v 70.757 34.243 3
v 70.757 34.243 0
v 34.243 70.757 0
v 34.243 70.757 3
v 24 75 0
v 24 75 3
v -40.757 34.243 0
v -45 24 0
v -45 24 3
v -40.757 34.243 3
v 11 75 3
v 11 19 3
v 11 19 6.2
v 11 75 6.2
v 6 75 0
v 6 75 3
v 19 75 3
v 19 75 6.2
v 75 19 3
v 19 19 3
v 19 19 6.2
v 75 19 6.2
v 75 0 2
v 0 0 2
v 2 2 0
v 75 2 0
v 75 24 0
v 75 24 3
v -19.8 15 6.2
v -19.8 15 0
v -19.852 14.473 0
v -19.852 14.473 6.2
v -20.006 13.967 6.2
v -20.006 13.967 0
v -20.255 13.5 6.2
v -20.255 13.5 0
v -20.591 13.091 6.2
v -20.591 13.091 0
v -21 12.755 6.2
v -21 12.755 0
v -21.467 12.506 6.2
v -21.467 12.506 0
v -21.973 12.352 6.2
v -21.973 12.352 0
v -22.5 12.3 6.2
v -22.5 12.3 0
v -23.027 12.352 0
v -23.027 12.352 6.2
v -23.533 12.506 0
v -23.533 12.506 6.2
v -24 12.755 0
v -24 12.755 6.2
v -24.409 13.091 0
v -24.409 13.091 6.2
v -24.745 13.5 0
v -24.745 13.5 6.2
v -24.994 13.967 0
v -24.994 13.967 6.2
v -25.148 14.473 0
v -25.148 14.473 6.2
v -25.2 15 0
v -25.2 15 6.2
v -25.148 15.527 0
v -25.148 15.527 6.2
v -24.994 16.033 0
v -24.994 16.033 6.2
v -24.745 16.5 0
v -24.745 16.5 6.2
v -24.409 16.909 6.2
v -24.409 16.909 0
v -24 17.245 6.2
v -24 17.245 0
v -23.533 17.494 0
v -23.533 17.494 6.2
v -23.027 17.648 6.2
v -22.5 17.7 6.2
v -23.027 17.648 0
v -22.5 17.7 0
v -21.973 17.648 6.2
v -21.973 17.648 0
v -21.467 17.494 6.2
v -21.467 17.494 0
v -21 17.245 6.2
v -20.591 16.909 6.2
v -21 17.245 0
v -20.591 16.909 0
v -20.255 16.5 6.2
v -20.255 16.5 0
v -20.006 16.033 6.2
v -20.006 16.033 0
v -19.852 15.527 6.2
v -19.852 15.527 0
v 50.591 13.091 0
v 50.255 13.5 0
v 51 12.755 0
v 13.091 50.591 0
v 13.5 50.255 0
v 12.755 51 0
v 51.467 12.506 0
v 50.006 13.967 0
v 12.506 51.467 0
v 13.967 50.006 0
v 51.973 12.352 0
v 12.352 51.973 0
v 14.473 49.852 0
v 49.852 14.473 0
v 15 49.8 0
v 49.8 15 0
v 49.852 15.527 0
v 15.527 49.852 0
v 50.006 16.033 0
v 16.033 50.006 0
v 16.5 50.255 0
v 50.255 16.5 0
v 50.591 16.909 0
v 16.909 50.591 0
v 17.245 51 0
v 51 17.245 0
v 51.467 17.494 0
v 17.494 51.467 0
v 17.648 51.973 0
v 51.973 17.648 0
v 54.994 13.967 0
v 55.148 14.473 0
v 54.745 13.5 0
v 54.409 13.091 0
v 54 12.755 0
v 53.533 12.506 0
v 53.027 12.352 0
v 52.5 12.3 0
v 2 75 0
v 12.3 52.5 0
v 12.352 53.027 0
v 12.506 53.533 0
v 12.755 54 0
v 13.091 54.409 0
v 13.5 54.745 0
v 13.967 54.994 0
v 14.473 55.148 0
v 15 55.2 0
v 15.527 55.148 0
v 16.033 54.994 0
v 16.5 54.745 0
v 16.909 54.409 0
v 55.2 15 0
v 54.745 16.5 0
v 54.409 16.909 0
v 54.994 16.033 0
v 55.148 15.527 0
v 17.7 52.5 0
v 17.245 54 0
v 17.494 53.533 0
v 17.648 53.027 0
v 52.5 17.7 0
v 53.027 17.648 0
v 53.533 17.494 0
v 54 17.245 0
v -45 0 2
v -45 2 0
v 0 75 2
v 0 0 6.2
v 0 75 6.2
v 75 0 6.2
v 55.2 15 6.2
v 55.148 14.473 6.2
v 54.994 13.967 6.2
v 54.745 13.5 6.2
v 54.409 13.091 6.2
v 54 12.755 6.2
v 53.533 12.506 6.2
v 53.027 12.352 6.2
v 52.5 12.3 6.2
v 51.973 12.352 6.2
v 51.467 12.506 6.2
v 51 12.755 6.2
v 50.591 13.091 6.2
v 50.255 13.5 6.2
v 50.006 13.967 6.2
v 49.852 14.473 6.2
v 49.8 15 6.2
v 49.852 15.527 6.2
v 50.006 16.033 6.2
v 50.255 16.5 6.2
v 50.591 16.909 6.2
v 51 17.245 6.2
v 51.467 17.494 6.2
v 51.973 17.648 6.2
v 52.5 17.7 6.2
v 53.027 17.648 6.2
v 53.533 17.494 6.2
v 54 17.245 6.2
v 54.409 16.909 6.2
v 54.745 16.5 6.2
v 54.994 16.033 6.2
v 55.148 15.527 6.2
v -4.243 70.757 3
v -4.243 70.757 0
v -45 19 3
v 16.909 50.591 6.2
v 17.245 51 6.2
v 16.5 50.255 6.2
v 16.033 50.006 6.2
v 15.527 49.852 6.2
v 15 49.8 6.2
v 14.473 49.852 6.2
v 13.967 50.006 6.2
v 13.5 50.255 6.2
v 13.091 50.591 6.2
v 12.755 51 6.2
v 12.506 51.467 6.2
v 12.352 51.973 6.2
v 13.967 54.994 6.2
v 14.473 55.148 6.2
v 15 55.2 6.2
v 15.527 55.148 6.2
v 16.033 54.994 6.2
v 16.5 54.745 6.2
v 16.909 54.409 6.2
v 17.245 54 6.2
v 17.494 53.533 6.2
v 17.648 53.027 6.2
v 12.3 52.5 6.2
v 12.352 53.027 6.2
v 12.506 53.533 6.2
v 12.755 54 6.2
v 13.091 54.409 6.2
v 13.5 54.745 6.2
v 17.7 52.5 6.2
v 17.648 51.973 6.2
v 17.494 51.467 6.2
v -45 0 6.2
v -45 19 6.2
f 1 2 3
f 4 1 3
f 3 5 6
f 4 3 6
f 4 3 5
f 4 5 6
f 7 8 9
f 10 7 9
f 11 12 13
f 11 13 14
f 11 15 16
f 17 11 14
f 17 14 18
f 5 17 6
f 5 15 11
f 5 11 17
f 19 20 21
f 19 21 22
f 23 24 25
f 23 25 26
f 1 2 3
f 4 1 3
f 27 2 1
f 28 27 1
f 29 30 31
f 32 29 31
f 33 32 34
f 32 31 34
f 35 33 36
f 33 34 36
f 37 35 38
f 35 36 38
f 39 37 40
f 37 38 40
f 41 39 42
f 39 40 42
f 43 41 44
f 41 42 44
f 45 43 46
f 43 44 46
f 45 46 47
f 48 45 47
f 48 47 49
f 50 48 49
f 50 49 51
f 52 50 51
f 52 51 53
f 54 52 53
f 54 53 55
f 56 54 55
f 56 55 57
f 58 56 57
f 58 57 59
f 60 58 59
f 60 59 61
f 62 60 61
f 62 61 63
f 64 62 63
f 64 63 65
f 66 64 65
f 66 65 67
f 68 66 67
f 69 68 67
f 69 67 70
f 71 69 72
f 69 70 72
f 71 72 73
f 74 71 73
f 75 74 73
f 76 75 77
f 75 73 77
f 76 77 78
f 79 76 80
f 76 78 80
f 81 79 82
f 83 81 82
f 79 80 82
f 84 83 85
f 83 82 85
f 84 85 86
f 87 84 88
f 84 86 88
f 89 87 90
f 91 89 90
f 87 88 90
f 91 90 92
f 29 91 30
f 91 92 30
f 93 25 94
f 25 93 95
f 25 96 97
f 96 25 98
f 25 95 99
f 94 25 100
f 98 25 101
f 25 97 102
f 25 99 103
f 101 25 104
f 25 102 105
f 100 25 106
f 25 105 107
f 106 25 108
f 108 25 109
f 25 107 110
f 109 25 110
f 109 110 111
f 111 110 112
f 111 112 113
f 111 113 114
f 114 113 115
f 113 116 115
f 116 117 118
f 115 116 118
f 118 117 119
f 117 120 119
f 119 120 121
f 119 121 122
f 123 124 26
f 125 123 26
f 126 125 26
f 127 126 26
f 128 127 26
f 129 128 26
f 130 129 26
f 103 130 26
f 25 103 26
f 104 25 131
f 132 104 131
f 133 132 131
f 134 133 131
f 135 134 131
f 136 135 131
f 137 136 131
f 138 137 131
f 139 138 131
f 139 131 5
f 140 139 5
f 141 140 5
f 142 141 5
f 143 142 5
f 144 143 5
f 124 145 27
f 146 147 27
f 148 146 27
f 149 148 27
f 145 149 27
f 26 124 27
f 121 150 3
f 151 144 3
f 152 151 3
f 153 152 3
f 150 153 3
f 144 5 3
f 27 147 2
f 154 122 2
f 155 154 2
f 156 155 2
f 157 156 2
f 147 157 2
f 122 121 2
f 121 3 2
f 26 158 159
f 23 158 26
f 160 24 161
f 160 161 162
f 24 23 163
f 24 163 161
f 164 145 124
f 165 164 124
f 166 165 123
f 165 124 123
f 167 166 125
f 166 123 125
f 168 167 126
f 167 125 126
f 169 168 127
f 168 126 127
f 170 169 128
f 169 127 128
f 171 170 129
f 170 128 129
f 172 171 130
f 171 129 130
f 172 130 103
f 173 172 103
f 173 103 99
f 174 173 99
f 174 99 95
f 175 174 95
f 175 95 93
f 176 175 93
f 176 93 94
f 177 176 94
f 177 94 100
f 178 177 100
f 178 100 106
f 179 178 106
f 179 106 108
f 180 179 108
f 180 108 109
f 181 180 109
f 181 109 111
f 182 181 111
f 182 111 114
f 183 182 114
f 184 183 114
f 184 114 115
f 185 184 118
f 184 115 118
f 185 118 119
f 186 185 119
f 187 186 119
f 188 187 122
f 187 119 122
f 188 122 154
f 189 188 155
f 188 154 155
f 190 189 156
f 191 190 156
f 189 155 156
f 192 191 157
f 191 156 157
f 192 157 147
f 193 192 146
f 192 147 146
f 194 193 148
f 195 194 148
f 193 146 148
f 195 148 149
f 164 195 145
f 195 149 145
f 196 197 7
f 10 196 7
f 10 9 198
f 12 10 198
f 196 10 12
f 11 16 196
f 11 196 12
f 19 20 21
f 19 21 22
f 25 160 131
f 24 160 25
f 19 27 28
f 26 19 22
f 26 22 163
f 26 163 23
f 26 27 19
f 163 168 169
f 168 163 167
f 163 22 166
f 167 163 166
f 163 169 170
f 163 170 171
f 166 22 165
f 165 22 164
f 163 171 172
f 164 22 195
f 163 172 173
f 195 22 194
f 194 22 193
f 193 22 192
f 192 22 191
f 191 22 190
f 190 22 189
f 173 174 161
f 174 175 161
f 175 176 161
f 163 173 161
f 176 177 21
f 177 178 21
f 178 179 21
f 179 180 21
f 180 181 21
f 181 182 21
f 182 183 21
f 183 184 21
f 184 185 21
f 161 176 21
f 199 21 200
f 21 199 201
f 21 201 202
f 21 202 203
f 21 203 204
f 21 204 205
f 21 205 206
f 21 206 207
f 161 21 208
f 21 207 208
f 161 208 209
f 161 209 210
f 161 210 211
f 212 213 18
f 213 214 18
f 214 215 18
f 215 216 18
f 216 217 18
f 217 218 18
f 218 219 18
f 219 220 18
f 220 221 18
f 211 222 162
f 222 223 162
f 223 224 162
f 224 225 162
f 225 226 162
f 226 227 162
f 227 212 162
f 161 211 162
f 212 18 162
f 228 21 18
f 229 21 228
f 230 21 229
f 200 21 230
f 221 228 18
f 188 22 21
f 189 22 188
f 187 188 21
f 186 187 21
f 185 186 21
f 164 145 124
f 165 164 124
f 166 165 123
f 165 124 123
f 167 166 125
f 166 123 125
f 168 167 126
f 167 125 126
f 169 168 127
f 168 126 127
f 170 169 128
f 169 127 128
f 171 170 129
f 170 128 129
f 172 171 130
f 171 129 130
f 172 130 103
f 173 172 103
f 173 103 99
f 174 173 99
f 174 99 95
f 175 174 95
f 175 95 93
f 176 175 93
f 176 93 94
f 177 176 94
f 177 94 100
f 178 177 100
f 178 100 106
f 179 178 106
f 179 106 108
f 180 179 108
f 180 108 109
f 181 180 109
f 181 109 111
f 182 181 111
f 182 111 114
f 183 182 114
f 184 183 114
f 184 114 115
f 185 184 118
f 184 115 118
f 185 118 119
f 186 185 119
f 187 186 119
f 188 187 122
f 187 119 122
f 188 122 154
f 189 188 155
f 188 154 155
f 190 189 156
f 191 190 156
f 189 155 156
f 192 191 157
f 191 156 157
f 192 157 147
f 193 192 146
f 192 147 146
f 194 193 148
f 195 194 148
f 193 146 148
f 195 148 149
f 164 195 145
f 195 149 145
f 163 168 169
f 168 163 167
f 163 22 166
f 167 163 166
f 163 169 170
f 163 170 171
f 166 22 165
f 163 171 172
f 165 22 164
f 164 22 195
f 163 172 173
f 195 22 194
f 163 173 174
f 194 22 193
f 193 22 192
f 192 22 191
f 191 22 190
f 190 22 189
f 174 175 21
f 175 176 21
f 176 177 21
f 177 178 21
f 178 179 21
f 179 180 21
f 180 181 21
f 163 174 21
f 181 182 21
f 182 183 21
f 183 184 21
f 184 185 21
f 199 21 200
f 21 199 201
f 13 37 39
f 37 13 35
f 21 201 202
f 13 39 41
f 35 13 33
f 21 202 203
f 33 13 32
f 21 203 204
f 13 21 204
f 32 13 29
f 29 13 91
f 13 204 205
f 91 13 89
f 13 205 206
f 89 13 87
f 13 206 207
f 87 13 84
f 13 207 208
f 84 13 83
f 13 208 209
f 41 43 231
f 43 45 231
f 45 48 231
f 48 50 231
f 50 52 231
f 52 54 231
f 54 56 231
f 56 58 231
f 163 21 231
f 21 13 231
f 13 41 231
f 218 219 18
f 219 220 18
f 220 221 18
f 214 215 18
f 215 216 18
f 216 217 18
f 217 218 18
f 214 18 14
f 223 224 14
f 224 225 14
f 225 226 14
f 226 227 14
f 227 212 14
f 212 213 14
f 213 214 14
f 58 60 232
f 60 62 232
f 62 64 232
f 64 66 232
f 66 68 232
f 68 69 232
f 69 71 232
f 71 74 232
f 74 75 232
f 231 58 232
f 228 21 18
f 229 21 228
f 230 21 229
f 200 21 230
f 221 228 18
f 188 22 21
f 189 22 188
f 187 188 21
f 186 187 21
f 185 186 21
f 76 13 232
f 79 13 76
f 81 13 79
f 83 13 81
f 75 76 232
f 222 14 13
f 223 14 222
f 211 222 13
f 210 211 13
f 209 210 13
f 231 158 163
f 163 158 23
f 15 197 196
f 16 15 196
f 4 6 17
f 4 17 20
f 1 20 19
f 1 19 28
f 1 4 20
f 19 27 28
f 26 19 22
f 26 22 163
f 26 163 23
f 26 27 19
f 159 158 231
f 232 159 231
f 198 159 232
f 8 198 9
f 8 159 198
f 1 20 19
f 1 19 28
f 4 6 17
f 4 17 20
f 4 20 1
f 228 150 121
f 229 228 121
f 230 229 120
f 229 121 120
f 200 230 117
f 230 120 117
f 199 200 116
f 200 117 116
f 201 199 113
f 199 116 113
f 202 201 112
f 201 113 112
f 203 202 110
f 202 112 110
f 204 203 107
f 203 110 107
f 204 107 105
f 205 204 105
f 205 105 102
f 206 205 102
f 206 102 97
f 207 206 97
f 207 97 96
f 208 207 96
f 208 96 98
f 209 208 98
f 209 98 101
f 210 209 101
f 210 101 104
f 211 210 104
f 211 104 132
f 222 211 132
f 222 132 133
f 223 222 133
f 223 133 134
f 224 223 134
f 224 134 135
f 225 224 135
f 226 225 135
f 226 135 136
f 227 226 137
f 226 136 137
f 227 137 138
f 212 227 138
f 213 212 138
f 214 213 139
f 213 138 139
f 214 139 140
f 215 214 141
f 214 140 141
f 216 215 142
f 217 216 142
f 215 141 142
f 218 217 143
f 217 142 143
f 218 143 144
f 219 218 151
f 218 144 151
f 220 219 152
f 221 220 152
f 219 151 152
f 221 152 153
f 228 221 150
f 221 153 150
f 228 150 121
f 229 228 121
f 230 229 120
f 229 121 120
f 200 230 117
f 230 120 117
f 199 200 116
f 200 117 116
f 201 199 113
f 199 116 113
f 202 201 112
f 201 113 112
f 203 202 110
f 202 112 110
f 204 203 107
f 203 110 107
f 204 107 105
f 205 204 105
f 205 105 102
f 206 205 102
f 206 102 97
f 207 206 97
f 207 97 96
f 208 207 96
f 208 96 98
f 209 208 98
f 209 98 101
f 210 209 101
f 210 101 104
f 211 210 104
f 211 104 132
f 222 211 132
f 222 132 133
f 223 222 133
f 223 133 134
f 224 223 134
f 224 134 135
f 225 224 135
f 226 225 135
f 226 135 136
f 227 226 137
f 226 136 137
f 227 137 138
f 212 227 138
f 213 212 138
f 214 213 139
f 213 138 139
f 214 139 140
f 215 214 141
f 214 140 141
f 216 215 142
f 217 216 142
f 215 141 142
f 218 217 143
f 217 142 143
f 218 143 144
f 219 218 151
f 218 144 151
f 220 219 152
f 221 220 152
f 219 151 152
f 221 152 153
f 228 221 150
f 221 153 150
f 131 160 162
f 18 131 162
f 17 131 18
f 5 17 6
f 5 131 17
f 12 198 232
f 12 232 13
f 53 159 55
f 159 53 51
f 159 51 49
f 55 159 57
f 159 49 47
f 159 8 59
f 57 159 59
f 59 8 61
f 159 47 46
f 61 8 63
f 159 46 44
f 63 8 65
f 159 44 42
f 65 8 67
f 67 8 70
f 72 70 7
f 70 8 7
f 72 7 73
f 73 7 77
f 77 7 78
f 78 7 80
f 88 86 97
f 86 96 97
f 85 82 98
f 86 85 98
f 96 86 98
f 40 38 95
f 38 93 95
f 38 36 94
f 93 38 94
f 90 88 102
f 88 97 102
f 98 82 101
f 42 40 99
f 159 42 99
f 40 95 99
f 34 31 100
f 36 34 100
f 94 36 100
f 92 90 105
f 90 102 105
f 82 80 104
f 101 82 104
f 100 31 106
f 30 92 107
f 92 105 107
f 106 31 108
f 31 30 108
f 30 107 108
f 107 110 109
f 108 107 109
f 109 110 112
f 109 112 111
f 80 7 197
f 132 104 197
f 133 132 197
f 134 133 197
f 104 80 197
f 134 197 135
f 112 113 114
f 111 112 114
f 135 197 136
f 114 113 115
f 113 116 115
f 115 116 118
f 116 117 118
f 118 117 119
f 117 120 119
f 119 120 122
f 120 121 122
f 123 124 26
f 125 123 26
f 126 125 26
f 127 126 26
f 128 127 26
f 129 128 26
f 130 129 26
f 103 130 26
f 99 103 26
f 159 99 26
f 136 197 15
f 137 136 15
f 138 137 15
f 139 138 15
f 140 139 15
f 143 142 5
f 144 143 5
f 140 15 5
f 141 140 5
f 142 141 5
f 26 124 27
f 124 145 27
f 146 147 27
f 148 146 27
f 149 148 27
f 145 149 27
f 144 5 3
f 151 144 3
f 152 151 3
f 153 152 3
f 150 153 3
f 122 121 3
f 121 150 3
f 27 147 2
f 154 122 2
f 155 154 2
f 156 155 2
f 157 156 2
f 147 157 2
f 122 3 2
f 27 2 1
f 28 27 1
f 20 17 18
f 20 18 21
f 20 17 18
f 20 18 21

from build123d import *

# Parameters (mm, degrees)
PAD_DEPTH       = 3
PAD001_DEPTH    = 3.2
SKETCH002_R     = 2.7
POCKET_DEPTH    = 8
CHAMFER_SIZE    = 2
CHAMFER001_SIZE = 6
PAD002_DEPTH    = 3
PAD003_DEPTH    = 3.2
SKETCH005_R     = 2.7
POCKET001_DEPTH = 8
CHAMFER002_SIZE = 2
CHAMFER003_SIZE = 6


with BuildPart() as corner_plexi_mount_body:
    # Sketch → Pad (new body)
    with BuildSketch(Plane.XY):
        Polygon((75, 0), (75, 30), (30, 75), (0, 75), (0, 0), align=None)
    extrude(amount=PAD_DEPTH)

    # Sketch001 (on Face7 of Pad) → Pad001 (join)
    with BuildSketch(Plane.XY.offset(3)):
        Polygon((0, 75), (19, 75), (19, 19), (75, 19), (75, 0), (0, 0), align=None)
    extrude(amount=PAD001_DEPTH)

    # Sketch002 (on Face2 of Pad001) → Pocket (cut)
    with BuildSketch(Plane(origin=(0, 0, 0), x_dir=(1, 0, 0), z_dir=(0, 0, -1))):
        with Locations((52.5, -15)):
            Circle(SKETCH002_R)
        with Locations((15, -52.5)):
            Circle(SKETCH002_R)
    extrude(amount=-POCKET_DEPTH, mode=Mode.SUBTRACT)

    # Chamfer
    chamfer_edges = [corner_plexi_mount_body.edges().sort_by_distance(p)[0] for p in [
        (37.5, 0, 0),
        (0, 37.5, 0),
    ]]
    chamfer(chamfer_edges, length=CHAMFER_SIZE)

    # Chamfer001
    chamfer001_edges = [corner_plexi_mount_body.edges().sort_by_distance(p)[0] for p in [
        (75, 30, 1.5),
        (30, 75, 1.5),
    ]]
    chamfer(chamfer001_edges, length=CHAMFER001_SIZE)


with BuildPart() as plexi_mount_part001:
    # Sketch003 → Pad002 (new body)
    with BuildSketch(Plane.XY):
        Polygon((75, 0), (75, 30), (30, 75), (0, 75), (-45, 30), (-45, 0), (0, 0), align=None)
    extrude(amount=PAD002_DEPTH)

    # Sketch004 (on Face7 of Pad002) → Pad003 (join)
    with BuildSketch(Plane.XY.offset(3)):
        Polygon((19, 75), (19, 19), (75, 19), (75, 0), (0, 0), (-45, 0), (-45, 19), (11, 19), (11, 75), align=None)
    extrude(amount=PAD003_DEPTH)

    # Sketch005 (on Face2 of Pad003) → Pocket001 (cut)
    with BuildSketch(Plane(origin=(0, 0, 0), x_dir=(1, 0, 0), z_dir=(0, 0, -1))):
        with Locations((52.5, -15)):
            Circle(SKETCH005_R)
        with Locations((15, -52.5)):
            Circle(SKETCH005_R)
        with Locations((-22.5, -15)):
            Circle(SKETCH005_R)
    extrude(amount=-POCKET001_DEPTH, mode=Mode.SUBTRACT)

    # Chamfer002
    chamfer002_edges = [plexi_mount_part001.edges().sort_by_distance(p)[0] for p in [
        (15, 0, 0),
    ]]
    chamfer(chamfer002_edges, length=CHAMFER002_SIZE)

    # Chamfer003
    chamfer003_edges = [plexi_mount_part001.edges().sort_by_distance(p)[0] for p in [
        (0, 75, 1.5),
        (-45, 30, 1.5),
        (30, 75, 1.5),
        (75, 30, 1.5),
    ]]
    chamfer(chamfer003_edges, length=CHAMFER003_SIZE)


solid = Compound([corner_plexi_mount_body.part, plexi_mount_part001.part])
